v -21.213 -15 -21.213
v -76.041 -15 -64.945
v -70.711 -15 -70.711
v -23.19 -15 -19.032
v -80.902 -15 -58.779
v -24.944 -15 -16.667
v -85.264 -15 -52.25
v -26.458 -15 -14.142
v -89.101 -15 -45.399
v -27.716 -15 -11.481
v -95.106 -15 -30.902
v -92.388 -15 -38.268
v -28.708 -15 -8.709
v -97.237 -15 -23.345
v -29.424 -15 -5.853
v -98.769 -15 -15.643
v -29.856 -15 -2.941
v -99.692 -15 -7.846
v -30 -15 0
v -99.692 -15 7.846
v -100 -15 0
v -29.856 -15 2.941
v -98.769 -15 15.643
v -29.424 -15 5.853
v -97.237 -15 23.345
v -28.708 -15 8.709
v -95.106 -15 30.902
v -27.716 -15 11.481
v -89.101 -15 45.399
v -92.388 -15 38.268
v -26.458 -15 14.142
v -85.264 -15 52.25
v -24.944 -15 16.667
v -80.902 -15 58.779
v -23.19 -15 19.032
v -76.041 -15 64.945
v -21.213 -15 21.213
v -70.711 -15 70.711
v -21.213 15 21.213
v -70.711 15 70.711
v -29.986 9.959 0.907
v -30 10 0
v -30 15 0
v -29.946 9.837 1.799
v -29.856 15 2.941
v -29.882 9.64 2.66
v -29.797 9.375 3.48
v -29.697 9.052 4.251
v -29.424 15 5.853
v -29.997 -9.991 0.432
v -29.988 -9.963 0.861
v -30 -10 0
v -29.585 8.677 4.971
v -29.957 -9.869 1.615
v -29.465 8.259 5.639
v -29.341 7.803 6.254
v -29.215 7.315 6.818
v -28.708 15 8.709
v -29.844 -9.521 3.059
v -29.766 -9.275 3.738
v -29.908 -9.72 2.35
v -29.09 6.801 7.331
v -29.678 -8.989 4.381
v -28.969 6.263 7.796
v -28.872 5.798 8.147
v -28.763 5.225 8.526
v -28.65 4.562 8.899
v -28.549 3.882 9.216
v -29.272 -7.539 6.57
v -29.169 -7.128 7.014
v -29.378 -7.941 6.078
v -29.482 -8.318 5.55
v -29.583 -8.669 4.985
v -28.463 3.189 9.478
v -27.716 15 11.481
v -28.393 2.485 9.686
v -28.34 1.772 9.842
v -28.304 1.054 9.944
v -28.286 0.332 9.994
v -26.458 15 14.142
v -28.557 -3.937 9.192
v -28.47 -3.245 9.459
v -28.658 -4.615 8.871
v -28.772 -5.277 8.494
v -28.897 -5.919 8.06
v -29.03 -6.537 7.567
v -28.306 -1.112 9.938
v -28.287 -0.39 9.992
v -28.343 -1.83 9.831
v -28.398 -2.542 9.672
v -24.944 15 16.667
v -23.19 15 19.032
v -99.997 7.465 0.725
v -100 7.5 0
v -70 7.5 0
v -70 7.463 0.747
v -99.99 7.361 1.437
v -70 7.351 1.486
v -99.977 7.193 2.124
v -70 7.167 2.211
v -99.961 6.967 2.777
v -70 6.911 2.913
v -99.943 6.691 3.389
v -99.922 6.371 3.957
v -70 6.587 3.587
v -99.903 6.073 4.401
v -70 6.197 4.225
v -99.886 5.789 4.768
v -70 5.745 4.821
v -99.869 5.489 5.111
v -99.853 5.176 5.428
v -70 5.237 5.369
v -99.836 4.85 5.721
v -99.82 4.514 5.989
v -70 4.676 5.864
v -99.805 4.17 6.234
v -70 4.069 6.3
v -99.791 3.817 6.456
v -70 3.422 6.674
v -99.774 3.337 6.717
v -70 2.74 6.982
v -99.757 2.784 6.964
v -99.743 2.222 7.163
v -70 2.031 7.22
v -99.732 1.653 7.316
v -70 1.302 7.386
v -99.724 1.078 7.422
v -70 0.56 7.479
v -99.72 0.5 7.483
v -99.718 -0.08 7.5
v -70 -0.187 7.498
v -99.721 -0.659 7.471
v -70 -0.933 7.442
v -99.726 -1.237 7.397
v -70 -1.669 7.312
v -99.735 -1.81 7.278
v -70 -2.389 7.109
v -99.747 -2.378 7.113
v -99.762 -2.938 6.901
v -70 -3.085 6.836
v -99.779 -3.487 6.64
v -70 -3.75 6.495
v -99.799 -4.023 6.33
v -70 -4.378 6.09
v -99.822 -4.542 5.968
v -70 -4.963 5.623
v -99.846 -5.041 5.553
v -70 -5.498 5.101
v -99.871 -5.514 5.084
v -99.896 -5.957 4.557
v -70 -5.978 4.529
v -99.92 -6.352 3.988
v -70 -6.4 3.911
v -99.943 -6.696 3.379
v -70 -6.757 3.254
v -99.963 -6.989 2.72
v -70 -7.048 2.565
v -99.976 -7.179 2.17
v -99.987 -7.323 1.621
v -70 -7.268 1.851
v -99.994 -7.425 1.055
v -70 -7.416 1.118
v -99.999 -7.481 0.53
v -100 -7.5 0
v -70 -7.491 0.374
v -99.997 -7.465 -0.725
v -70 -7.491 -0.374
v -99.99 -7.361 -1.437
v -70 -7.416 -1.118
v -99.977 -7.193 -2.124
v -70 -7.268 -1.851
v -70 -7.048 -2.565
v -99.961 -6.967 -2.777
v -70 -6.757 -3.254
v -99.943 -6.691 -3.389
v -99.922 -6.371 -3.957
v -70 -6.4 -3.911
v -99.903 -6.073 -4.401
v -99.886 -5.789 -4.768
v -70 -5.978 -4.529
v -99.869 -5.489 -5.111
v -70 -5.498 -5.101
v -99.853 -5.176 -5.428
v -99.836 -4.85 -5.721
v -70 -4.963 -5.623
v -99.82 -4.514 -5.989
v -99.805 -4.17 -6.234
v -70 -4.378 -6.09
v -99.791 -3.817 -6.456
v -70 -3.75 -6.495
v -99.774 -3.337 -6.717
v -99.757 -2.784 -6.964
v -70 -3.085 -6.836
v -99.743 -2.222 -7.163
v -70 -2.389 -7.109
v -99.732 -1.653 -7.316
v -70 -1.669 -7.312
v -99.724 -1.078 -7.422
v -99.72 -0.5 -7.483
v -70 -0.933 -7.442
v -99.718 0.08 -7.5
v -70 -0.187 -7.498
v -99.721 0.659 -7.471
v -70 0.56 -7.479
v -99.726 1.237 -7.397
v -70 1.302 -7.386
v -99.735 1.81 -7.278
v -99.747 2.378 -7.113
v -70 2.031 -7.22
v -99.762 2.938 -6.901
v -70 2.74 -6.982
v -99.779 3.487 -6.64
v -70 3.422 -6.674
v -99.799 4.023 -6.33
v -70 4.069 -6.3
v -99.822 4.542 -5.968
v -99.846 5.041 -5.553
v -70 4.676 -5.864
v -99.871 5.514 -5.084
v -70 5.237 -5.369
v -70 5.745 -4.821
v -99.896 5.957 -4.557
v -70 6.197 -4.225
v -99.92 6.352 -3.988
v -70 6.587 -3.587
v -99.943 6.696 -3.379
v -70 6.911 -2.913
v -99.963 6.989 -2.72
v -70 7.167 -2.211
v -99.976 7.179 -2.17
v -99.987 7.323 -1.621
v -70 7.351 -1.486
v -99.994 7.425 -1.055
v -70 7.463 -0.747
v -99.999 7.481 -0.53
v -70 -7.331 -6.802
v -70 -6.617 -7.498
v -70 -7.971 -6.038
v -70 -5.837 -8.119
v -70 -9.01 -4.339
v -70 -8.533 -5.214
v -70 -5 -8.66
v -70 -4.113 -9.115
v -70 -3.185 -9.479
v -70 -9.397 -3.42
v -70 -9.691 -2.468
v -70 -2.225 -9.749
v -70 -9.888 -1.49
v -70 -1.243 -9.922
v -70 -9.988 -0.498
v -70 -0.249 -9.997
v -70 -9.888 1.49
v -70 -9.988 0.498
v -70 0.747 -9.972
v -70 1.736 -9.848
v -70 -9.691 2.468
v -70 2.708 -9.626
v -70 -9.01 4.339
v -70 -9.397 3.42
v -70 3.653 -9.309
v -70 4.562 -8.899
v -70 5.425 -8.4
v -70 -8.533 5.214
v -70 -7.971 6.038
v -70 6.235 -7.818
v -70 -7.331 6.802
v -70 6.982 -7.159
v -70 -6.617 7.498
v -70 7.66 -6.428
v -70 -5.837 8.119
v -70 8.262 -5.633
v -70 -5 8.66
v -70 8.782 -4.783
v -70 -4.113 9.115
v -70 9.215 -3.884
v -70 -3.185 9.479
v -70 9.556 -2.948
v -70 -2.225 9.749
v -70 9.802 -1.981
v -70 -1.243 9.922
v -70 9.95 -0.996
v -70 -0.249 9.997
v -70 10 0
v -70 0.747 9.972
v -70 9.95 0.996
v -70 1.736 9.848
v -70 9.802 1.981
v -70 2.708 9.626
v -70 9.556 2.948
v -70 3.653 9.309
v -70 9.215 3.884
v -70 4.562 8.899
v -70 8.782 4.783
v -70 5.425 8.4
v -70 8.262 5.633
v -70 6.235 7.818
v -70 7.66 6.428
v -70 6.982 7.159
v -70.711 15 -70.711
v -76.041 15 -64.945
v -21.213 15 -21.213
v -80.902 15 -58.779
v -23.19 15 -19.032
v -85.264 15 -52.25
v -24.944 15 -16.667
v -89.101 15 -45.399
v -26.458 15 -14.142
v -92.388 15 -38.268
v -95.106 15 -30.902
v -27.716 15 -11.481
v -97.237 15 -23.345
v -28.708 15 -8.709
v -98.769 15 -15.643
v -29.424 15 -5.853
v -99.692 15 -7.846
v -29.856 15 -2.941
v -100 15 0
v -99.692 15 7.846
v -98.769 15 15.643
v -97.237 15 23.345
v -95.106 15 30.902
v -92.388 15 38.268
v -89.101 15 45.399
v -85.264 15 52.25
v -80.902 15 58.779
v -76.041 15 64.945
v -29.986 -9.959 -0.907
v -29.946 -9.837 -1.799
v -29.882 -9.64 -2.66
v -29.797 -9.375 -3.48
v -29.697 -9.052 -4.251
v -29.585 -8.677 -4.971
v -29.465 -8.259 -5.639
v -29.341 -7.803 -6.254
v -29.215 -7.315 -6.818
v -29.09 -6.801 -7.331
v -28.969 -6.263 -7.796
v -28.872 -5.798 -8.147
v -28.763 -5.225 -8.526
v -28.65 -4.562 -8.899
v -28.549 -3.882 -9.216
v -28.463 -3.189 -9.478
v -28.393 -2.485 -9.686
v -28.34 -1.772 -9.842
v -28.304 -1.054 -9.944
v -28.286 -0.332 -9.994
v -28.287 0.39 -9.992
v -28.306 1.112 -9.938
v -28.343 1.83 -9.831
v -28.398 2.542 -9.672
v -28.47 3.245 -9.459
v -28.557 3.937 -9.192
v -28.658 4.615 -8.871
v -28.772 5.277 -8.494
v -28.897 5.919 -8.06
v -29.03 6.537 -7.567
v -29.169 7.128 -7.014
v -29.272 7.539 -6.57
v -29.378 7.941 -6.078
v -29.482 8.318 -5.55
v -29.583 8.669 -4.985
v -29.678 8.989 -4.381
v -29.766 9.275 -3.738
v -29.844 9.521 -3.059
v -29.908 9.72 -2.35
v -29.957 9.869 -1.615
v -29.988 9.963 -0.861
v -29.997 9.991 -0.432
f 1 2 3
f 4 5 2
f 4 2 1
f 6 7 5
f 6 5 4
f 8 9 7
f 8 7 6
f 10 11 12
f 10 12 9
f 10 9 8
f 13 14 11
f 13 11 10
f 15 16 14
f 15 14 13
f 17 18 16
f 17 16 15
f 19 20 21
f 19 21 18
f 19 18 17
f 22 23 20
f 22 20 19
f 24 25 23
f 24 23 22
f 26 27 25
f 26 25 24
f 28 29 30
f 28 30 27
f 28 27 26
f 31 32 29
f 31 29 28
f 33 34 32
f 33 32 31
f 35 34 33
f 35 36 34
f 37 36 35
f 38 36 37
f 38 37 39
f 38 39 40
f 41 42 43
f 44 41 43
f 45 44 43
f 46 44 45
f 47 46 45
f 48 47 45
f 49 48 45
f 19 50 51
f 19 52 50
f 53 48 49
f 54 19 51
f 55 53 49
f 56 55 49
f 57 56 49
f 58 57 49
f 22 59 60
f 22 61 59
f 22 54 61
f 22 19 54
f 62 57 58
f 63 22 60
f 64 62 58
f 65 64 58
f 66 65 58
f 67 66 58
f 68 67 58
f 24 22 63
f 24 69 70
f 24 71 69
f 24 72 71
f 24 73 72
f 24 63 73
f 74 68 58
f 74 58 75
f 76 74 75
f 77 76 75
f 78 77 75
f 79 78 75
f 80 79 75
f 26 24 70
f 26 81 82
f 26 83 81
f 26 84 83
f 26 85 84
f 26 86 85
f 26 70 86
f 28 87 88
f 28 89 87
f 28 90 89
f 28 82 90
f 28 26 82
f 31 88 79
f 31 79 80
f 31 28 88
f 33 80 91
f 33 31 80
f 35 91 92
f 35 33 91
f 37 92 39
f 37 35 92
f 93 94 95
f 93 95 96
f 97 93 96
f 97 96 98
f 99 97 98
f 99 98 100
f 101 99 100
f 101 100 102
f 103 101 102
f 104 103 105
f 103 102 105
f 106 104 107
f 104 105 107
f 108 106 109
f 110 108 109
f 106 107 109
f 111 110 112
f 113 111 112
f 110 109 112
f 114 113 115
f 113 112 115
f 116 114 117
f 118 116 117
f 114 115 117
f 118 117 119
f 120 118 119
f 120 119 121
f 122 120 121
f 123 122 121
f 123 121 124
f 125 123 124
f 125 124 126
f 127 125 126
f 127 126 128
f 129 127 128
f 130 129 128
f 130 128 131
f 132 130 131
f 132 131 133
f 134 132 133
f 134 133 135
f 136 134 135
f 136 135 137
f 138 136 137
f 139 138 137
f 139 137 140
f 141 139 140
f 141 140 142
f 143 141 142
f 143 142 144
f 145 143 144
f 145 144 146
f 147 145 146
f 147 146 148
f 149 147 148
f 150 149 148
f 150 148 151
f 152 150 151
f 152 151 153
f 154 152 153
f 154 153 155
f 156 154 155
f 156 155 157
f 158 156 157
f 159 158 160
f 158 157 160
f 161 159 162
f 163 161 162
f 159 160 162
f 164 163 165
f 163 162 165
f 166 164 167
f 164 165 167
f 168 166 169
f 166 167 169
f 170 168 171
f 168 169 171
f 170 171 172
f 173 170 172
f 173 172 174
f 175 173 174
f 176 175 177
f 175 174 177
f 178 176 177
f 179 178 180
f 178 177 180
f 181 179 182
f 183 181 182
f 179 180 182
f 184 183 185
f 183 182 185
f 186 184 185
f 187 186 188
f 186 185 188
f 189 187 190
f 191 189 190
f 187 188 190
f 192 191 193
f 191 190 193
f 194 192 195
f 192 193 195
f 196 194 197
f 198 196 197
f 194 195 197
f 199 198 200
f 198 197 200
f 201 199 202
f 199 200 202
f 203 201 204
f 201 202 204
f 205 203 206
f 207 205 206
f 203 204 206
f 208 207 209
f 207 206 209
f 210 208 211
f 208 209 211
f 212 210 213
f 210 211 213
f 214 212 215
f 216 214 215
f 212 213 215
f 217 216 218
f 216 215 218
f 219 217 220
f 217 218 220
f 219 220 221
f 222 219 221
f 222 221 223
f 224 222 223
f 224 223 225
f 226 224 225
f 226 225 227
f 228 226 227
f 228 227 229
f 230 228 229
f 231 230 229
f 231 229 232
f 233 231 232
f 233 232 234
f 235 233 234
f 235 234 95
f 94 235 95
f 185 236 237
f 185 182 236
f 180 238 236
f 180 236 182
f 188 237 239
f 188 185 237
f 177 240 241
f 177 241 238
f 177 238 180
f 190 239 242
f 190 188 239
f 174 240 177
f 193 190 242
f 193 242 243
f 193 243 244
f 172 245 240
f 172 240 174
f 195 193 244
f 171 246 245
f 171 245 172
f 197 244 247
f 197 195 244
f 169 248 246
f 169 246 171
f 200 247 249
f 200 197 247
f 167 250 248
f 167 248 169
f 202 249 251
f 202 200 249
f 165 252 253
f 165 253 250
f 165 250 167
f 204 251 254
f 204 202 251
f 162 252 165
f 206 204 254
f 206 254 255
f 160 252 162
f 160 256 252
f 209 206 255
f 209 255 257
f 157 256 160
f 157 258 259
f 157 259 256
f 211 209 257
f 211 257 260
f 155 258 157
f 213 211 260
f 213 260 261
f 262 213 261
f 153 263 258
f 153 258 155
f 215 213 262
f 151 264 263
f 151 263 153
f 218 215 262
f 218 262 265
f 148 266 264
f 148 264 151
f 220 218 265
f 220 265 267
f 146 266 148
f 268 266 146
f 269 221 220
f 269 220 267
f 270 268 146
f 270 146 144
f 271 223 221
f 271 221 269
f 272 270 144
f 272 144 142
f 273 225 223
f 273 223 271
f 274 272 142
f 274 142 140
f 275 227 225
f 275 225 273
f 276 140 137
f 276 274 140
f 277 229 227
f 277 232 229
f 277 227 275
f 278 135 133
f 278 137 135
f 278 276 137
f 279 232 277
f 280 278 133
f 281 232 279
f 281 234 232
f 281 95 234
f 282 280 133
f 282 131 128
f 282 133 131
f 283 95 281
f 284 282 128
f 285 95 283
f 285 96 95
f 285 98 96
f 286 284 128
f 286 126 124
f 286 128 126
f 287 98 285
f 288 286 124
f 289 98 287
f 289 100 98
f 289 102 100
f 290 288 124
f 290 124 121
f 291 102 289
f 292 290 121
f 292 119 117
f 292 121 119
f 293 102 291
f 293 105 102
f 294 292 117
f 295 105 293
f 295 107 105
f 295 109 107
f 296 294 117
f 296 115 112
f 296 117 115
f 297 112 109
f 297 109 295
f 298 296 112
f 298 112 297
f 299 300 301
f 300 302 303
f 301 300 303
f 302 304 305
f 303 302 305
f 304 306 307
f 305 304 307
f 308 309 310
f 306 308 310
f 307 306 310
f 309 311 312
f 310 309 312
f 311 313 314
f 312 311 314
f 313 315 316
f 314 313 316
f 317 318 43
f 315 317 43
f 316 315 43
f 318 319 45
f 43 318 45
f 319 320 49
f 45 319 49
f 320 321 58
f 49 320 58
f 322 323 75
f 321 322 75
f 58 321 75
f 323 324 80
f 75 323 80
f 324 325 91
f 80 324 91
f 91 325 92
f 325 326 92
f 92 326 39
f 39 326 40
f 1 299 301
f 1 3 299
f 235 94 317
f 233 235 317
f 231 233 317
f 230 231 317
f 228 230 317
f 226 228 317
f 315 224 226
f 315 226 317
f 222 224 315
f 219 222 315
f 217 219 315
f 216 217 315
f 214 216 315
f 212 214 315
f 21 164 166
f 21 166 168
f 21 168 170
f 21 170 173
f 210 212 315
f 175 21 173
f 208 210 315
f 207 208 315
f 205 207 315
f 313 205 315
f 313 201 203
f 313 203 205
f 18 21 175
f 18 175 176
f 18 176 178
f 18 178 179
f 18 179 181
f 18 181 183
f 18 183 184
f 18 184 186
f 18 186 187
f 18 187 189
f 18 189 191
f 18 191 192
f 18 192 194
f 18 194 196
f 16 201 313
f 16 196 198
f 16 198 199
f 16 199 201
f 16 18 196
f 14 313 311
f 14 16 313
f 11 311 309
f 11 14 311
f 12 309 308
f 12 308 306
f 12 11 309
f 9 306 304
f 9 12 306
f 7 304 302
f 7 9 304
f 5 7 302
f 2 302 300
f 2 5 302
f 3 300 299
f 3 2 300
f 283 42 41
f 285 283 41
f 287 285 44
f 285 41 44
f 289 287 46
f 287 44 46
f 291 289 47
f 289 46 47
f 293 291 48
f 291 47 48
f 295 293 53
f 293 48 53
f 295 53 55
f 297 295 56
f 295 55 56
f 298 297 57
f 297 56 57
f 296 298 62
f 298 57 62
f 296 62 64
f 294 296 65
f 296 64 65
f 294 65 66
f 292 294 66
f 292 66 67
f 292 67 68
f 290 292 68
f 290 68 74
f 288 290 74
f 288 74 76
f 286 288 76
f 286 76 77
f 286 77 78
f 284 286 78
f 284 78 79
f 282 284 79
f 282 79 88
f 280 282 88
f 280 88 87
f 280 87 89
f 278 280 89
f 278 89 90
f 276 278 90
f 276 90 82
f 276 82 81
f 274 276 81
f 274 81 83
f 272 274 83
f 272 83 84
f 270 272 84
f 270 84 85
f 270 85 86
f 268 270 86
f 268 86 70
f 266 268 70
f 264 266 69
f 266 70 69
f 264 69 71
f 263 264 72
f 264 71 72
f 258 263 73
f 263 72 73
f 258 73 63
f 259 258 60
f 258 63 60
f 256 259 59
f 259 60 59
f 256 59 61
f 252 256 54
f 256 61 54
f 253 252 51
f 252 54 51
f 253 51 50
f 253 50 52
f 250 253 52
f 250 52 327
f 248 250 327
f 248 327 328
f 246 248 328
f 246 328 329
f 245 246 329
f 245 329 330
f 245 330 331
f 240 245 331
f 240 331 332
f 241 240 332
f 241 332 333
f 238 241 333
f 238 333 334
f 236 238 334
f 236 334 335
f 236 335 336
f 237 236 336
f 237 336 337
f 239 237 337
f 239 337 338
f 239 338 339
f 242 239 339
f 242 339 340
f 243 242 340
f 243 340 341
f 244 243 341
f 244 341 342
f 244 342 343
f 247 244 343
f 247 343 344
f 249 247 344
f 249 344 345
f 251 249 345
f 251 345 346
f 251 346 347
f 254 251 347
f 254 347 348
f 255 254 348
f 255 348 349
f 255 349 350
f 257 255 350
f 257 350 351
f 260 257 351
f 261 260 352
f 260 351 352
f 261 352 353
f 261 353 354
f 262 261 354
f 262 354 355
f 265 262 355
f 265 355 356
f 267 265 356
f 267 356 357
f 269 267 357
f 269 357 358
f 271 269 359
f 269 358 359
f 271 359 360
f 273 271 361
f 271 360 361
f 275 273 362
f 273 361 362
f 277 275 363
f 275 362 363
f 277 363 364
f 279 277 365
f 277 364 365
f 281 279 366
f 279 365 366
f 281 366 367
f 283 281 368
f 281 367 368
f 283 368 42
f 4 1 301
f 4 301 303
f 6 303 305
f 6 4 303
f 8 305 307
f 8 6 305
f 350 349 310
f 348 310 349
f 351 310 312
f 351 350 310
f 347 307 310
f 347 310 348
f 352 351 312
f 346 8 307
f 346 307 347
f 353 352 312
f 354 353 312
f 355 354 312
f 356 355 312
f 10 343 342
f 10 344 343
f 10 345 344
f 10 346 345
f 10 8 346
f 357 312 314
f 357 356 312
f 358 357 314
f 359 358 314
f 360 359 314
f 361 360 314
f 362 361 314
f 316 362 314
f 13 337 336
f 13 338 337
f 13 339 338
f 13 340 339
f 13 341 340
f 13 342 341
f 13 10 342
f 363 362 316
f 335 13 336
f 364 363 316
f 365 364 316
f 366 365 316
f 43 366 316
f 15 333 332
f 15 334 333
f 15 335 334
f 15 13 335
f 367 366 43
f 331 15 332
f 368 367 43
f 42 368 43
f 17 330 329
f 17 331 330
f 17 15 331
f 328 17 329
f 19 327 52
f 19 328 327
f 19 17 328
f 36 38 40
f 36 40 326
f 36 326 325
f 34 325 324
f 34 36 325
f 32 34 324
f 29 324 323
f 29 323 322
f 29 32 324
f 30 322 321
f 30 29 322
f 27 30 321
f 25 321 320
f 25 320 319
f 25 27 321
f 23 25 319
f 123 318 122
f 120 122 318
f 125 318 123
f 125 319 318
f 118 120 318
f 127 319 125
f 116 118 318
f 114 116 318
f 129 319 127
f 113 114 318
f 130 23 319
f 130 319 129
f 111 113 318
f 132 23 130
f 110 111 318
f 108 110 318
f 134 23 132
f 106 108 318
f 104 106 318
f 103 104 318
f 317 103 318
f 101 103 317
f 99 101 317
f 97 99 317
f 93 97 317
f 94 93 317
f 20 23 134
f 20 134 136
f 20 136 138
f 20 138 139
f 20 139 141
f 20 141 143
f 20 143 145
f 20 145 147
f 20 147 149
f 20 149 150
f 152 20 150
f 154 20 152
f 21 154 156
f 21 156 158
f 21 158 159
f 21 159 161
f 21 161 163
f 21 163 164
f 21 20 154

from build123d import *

# Parameters (mm, degrees)
F1_DEPTH = 15
F2_R     = 7.5
F3_DEPTH = 107.336067
F4_R     = 10
F5_DEPTH = 70


with BuildPart() as f1:
    # F0 (on Front) → F1 (new body, symmetric)
    with BuildSketch(Plane.XZ):
        with BuildLine():
            ThreePointArc((-30, 0), (-27.716386, 11.480503), (-21.213203, 21.213203))
            Line((-21.213203, 21.213203), (-70.710678, 70.710678))
            ThreePointArc((-70.710678, 70.710678), (-92.387953, 38.268343), (-100, 0))
            Line((-100, 0), (-30, 0))
        make_face()
        with BuildLine():
            ThreePointArc((-21.213203, -21.213203), (-27.716386, -11.480503), (-30, 0))
            Line((-30, 0), (-100, 0))
            ThreePointArc((-100, 0), (-92.387953, -38.268343), (-70.710678, -70.710678))
            Line((-70.710678, -70.710678), (-21.213203, -21.213203))
        make_face()
    extrude(amount=F1_DEPTH, both=True)

    # F2 (on Right) → F3 (cut)
    with BuildSketch(Plane.YZ):
        Circle(F2_R)
    extrude(amount=-F3_DEPTH, mode=Mode.SUBTRACT)

    # F4 (on Right) → F5 (cut)
    with BuildSketch(Plane.YZ):
        Circle(F4_R)
    extrude(amount=-F5_DEPTH, mode=Mode.SUBTRACT)


solid = f1.part
